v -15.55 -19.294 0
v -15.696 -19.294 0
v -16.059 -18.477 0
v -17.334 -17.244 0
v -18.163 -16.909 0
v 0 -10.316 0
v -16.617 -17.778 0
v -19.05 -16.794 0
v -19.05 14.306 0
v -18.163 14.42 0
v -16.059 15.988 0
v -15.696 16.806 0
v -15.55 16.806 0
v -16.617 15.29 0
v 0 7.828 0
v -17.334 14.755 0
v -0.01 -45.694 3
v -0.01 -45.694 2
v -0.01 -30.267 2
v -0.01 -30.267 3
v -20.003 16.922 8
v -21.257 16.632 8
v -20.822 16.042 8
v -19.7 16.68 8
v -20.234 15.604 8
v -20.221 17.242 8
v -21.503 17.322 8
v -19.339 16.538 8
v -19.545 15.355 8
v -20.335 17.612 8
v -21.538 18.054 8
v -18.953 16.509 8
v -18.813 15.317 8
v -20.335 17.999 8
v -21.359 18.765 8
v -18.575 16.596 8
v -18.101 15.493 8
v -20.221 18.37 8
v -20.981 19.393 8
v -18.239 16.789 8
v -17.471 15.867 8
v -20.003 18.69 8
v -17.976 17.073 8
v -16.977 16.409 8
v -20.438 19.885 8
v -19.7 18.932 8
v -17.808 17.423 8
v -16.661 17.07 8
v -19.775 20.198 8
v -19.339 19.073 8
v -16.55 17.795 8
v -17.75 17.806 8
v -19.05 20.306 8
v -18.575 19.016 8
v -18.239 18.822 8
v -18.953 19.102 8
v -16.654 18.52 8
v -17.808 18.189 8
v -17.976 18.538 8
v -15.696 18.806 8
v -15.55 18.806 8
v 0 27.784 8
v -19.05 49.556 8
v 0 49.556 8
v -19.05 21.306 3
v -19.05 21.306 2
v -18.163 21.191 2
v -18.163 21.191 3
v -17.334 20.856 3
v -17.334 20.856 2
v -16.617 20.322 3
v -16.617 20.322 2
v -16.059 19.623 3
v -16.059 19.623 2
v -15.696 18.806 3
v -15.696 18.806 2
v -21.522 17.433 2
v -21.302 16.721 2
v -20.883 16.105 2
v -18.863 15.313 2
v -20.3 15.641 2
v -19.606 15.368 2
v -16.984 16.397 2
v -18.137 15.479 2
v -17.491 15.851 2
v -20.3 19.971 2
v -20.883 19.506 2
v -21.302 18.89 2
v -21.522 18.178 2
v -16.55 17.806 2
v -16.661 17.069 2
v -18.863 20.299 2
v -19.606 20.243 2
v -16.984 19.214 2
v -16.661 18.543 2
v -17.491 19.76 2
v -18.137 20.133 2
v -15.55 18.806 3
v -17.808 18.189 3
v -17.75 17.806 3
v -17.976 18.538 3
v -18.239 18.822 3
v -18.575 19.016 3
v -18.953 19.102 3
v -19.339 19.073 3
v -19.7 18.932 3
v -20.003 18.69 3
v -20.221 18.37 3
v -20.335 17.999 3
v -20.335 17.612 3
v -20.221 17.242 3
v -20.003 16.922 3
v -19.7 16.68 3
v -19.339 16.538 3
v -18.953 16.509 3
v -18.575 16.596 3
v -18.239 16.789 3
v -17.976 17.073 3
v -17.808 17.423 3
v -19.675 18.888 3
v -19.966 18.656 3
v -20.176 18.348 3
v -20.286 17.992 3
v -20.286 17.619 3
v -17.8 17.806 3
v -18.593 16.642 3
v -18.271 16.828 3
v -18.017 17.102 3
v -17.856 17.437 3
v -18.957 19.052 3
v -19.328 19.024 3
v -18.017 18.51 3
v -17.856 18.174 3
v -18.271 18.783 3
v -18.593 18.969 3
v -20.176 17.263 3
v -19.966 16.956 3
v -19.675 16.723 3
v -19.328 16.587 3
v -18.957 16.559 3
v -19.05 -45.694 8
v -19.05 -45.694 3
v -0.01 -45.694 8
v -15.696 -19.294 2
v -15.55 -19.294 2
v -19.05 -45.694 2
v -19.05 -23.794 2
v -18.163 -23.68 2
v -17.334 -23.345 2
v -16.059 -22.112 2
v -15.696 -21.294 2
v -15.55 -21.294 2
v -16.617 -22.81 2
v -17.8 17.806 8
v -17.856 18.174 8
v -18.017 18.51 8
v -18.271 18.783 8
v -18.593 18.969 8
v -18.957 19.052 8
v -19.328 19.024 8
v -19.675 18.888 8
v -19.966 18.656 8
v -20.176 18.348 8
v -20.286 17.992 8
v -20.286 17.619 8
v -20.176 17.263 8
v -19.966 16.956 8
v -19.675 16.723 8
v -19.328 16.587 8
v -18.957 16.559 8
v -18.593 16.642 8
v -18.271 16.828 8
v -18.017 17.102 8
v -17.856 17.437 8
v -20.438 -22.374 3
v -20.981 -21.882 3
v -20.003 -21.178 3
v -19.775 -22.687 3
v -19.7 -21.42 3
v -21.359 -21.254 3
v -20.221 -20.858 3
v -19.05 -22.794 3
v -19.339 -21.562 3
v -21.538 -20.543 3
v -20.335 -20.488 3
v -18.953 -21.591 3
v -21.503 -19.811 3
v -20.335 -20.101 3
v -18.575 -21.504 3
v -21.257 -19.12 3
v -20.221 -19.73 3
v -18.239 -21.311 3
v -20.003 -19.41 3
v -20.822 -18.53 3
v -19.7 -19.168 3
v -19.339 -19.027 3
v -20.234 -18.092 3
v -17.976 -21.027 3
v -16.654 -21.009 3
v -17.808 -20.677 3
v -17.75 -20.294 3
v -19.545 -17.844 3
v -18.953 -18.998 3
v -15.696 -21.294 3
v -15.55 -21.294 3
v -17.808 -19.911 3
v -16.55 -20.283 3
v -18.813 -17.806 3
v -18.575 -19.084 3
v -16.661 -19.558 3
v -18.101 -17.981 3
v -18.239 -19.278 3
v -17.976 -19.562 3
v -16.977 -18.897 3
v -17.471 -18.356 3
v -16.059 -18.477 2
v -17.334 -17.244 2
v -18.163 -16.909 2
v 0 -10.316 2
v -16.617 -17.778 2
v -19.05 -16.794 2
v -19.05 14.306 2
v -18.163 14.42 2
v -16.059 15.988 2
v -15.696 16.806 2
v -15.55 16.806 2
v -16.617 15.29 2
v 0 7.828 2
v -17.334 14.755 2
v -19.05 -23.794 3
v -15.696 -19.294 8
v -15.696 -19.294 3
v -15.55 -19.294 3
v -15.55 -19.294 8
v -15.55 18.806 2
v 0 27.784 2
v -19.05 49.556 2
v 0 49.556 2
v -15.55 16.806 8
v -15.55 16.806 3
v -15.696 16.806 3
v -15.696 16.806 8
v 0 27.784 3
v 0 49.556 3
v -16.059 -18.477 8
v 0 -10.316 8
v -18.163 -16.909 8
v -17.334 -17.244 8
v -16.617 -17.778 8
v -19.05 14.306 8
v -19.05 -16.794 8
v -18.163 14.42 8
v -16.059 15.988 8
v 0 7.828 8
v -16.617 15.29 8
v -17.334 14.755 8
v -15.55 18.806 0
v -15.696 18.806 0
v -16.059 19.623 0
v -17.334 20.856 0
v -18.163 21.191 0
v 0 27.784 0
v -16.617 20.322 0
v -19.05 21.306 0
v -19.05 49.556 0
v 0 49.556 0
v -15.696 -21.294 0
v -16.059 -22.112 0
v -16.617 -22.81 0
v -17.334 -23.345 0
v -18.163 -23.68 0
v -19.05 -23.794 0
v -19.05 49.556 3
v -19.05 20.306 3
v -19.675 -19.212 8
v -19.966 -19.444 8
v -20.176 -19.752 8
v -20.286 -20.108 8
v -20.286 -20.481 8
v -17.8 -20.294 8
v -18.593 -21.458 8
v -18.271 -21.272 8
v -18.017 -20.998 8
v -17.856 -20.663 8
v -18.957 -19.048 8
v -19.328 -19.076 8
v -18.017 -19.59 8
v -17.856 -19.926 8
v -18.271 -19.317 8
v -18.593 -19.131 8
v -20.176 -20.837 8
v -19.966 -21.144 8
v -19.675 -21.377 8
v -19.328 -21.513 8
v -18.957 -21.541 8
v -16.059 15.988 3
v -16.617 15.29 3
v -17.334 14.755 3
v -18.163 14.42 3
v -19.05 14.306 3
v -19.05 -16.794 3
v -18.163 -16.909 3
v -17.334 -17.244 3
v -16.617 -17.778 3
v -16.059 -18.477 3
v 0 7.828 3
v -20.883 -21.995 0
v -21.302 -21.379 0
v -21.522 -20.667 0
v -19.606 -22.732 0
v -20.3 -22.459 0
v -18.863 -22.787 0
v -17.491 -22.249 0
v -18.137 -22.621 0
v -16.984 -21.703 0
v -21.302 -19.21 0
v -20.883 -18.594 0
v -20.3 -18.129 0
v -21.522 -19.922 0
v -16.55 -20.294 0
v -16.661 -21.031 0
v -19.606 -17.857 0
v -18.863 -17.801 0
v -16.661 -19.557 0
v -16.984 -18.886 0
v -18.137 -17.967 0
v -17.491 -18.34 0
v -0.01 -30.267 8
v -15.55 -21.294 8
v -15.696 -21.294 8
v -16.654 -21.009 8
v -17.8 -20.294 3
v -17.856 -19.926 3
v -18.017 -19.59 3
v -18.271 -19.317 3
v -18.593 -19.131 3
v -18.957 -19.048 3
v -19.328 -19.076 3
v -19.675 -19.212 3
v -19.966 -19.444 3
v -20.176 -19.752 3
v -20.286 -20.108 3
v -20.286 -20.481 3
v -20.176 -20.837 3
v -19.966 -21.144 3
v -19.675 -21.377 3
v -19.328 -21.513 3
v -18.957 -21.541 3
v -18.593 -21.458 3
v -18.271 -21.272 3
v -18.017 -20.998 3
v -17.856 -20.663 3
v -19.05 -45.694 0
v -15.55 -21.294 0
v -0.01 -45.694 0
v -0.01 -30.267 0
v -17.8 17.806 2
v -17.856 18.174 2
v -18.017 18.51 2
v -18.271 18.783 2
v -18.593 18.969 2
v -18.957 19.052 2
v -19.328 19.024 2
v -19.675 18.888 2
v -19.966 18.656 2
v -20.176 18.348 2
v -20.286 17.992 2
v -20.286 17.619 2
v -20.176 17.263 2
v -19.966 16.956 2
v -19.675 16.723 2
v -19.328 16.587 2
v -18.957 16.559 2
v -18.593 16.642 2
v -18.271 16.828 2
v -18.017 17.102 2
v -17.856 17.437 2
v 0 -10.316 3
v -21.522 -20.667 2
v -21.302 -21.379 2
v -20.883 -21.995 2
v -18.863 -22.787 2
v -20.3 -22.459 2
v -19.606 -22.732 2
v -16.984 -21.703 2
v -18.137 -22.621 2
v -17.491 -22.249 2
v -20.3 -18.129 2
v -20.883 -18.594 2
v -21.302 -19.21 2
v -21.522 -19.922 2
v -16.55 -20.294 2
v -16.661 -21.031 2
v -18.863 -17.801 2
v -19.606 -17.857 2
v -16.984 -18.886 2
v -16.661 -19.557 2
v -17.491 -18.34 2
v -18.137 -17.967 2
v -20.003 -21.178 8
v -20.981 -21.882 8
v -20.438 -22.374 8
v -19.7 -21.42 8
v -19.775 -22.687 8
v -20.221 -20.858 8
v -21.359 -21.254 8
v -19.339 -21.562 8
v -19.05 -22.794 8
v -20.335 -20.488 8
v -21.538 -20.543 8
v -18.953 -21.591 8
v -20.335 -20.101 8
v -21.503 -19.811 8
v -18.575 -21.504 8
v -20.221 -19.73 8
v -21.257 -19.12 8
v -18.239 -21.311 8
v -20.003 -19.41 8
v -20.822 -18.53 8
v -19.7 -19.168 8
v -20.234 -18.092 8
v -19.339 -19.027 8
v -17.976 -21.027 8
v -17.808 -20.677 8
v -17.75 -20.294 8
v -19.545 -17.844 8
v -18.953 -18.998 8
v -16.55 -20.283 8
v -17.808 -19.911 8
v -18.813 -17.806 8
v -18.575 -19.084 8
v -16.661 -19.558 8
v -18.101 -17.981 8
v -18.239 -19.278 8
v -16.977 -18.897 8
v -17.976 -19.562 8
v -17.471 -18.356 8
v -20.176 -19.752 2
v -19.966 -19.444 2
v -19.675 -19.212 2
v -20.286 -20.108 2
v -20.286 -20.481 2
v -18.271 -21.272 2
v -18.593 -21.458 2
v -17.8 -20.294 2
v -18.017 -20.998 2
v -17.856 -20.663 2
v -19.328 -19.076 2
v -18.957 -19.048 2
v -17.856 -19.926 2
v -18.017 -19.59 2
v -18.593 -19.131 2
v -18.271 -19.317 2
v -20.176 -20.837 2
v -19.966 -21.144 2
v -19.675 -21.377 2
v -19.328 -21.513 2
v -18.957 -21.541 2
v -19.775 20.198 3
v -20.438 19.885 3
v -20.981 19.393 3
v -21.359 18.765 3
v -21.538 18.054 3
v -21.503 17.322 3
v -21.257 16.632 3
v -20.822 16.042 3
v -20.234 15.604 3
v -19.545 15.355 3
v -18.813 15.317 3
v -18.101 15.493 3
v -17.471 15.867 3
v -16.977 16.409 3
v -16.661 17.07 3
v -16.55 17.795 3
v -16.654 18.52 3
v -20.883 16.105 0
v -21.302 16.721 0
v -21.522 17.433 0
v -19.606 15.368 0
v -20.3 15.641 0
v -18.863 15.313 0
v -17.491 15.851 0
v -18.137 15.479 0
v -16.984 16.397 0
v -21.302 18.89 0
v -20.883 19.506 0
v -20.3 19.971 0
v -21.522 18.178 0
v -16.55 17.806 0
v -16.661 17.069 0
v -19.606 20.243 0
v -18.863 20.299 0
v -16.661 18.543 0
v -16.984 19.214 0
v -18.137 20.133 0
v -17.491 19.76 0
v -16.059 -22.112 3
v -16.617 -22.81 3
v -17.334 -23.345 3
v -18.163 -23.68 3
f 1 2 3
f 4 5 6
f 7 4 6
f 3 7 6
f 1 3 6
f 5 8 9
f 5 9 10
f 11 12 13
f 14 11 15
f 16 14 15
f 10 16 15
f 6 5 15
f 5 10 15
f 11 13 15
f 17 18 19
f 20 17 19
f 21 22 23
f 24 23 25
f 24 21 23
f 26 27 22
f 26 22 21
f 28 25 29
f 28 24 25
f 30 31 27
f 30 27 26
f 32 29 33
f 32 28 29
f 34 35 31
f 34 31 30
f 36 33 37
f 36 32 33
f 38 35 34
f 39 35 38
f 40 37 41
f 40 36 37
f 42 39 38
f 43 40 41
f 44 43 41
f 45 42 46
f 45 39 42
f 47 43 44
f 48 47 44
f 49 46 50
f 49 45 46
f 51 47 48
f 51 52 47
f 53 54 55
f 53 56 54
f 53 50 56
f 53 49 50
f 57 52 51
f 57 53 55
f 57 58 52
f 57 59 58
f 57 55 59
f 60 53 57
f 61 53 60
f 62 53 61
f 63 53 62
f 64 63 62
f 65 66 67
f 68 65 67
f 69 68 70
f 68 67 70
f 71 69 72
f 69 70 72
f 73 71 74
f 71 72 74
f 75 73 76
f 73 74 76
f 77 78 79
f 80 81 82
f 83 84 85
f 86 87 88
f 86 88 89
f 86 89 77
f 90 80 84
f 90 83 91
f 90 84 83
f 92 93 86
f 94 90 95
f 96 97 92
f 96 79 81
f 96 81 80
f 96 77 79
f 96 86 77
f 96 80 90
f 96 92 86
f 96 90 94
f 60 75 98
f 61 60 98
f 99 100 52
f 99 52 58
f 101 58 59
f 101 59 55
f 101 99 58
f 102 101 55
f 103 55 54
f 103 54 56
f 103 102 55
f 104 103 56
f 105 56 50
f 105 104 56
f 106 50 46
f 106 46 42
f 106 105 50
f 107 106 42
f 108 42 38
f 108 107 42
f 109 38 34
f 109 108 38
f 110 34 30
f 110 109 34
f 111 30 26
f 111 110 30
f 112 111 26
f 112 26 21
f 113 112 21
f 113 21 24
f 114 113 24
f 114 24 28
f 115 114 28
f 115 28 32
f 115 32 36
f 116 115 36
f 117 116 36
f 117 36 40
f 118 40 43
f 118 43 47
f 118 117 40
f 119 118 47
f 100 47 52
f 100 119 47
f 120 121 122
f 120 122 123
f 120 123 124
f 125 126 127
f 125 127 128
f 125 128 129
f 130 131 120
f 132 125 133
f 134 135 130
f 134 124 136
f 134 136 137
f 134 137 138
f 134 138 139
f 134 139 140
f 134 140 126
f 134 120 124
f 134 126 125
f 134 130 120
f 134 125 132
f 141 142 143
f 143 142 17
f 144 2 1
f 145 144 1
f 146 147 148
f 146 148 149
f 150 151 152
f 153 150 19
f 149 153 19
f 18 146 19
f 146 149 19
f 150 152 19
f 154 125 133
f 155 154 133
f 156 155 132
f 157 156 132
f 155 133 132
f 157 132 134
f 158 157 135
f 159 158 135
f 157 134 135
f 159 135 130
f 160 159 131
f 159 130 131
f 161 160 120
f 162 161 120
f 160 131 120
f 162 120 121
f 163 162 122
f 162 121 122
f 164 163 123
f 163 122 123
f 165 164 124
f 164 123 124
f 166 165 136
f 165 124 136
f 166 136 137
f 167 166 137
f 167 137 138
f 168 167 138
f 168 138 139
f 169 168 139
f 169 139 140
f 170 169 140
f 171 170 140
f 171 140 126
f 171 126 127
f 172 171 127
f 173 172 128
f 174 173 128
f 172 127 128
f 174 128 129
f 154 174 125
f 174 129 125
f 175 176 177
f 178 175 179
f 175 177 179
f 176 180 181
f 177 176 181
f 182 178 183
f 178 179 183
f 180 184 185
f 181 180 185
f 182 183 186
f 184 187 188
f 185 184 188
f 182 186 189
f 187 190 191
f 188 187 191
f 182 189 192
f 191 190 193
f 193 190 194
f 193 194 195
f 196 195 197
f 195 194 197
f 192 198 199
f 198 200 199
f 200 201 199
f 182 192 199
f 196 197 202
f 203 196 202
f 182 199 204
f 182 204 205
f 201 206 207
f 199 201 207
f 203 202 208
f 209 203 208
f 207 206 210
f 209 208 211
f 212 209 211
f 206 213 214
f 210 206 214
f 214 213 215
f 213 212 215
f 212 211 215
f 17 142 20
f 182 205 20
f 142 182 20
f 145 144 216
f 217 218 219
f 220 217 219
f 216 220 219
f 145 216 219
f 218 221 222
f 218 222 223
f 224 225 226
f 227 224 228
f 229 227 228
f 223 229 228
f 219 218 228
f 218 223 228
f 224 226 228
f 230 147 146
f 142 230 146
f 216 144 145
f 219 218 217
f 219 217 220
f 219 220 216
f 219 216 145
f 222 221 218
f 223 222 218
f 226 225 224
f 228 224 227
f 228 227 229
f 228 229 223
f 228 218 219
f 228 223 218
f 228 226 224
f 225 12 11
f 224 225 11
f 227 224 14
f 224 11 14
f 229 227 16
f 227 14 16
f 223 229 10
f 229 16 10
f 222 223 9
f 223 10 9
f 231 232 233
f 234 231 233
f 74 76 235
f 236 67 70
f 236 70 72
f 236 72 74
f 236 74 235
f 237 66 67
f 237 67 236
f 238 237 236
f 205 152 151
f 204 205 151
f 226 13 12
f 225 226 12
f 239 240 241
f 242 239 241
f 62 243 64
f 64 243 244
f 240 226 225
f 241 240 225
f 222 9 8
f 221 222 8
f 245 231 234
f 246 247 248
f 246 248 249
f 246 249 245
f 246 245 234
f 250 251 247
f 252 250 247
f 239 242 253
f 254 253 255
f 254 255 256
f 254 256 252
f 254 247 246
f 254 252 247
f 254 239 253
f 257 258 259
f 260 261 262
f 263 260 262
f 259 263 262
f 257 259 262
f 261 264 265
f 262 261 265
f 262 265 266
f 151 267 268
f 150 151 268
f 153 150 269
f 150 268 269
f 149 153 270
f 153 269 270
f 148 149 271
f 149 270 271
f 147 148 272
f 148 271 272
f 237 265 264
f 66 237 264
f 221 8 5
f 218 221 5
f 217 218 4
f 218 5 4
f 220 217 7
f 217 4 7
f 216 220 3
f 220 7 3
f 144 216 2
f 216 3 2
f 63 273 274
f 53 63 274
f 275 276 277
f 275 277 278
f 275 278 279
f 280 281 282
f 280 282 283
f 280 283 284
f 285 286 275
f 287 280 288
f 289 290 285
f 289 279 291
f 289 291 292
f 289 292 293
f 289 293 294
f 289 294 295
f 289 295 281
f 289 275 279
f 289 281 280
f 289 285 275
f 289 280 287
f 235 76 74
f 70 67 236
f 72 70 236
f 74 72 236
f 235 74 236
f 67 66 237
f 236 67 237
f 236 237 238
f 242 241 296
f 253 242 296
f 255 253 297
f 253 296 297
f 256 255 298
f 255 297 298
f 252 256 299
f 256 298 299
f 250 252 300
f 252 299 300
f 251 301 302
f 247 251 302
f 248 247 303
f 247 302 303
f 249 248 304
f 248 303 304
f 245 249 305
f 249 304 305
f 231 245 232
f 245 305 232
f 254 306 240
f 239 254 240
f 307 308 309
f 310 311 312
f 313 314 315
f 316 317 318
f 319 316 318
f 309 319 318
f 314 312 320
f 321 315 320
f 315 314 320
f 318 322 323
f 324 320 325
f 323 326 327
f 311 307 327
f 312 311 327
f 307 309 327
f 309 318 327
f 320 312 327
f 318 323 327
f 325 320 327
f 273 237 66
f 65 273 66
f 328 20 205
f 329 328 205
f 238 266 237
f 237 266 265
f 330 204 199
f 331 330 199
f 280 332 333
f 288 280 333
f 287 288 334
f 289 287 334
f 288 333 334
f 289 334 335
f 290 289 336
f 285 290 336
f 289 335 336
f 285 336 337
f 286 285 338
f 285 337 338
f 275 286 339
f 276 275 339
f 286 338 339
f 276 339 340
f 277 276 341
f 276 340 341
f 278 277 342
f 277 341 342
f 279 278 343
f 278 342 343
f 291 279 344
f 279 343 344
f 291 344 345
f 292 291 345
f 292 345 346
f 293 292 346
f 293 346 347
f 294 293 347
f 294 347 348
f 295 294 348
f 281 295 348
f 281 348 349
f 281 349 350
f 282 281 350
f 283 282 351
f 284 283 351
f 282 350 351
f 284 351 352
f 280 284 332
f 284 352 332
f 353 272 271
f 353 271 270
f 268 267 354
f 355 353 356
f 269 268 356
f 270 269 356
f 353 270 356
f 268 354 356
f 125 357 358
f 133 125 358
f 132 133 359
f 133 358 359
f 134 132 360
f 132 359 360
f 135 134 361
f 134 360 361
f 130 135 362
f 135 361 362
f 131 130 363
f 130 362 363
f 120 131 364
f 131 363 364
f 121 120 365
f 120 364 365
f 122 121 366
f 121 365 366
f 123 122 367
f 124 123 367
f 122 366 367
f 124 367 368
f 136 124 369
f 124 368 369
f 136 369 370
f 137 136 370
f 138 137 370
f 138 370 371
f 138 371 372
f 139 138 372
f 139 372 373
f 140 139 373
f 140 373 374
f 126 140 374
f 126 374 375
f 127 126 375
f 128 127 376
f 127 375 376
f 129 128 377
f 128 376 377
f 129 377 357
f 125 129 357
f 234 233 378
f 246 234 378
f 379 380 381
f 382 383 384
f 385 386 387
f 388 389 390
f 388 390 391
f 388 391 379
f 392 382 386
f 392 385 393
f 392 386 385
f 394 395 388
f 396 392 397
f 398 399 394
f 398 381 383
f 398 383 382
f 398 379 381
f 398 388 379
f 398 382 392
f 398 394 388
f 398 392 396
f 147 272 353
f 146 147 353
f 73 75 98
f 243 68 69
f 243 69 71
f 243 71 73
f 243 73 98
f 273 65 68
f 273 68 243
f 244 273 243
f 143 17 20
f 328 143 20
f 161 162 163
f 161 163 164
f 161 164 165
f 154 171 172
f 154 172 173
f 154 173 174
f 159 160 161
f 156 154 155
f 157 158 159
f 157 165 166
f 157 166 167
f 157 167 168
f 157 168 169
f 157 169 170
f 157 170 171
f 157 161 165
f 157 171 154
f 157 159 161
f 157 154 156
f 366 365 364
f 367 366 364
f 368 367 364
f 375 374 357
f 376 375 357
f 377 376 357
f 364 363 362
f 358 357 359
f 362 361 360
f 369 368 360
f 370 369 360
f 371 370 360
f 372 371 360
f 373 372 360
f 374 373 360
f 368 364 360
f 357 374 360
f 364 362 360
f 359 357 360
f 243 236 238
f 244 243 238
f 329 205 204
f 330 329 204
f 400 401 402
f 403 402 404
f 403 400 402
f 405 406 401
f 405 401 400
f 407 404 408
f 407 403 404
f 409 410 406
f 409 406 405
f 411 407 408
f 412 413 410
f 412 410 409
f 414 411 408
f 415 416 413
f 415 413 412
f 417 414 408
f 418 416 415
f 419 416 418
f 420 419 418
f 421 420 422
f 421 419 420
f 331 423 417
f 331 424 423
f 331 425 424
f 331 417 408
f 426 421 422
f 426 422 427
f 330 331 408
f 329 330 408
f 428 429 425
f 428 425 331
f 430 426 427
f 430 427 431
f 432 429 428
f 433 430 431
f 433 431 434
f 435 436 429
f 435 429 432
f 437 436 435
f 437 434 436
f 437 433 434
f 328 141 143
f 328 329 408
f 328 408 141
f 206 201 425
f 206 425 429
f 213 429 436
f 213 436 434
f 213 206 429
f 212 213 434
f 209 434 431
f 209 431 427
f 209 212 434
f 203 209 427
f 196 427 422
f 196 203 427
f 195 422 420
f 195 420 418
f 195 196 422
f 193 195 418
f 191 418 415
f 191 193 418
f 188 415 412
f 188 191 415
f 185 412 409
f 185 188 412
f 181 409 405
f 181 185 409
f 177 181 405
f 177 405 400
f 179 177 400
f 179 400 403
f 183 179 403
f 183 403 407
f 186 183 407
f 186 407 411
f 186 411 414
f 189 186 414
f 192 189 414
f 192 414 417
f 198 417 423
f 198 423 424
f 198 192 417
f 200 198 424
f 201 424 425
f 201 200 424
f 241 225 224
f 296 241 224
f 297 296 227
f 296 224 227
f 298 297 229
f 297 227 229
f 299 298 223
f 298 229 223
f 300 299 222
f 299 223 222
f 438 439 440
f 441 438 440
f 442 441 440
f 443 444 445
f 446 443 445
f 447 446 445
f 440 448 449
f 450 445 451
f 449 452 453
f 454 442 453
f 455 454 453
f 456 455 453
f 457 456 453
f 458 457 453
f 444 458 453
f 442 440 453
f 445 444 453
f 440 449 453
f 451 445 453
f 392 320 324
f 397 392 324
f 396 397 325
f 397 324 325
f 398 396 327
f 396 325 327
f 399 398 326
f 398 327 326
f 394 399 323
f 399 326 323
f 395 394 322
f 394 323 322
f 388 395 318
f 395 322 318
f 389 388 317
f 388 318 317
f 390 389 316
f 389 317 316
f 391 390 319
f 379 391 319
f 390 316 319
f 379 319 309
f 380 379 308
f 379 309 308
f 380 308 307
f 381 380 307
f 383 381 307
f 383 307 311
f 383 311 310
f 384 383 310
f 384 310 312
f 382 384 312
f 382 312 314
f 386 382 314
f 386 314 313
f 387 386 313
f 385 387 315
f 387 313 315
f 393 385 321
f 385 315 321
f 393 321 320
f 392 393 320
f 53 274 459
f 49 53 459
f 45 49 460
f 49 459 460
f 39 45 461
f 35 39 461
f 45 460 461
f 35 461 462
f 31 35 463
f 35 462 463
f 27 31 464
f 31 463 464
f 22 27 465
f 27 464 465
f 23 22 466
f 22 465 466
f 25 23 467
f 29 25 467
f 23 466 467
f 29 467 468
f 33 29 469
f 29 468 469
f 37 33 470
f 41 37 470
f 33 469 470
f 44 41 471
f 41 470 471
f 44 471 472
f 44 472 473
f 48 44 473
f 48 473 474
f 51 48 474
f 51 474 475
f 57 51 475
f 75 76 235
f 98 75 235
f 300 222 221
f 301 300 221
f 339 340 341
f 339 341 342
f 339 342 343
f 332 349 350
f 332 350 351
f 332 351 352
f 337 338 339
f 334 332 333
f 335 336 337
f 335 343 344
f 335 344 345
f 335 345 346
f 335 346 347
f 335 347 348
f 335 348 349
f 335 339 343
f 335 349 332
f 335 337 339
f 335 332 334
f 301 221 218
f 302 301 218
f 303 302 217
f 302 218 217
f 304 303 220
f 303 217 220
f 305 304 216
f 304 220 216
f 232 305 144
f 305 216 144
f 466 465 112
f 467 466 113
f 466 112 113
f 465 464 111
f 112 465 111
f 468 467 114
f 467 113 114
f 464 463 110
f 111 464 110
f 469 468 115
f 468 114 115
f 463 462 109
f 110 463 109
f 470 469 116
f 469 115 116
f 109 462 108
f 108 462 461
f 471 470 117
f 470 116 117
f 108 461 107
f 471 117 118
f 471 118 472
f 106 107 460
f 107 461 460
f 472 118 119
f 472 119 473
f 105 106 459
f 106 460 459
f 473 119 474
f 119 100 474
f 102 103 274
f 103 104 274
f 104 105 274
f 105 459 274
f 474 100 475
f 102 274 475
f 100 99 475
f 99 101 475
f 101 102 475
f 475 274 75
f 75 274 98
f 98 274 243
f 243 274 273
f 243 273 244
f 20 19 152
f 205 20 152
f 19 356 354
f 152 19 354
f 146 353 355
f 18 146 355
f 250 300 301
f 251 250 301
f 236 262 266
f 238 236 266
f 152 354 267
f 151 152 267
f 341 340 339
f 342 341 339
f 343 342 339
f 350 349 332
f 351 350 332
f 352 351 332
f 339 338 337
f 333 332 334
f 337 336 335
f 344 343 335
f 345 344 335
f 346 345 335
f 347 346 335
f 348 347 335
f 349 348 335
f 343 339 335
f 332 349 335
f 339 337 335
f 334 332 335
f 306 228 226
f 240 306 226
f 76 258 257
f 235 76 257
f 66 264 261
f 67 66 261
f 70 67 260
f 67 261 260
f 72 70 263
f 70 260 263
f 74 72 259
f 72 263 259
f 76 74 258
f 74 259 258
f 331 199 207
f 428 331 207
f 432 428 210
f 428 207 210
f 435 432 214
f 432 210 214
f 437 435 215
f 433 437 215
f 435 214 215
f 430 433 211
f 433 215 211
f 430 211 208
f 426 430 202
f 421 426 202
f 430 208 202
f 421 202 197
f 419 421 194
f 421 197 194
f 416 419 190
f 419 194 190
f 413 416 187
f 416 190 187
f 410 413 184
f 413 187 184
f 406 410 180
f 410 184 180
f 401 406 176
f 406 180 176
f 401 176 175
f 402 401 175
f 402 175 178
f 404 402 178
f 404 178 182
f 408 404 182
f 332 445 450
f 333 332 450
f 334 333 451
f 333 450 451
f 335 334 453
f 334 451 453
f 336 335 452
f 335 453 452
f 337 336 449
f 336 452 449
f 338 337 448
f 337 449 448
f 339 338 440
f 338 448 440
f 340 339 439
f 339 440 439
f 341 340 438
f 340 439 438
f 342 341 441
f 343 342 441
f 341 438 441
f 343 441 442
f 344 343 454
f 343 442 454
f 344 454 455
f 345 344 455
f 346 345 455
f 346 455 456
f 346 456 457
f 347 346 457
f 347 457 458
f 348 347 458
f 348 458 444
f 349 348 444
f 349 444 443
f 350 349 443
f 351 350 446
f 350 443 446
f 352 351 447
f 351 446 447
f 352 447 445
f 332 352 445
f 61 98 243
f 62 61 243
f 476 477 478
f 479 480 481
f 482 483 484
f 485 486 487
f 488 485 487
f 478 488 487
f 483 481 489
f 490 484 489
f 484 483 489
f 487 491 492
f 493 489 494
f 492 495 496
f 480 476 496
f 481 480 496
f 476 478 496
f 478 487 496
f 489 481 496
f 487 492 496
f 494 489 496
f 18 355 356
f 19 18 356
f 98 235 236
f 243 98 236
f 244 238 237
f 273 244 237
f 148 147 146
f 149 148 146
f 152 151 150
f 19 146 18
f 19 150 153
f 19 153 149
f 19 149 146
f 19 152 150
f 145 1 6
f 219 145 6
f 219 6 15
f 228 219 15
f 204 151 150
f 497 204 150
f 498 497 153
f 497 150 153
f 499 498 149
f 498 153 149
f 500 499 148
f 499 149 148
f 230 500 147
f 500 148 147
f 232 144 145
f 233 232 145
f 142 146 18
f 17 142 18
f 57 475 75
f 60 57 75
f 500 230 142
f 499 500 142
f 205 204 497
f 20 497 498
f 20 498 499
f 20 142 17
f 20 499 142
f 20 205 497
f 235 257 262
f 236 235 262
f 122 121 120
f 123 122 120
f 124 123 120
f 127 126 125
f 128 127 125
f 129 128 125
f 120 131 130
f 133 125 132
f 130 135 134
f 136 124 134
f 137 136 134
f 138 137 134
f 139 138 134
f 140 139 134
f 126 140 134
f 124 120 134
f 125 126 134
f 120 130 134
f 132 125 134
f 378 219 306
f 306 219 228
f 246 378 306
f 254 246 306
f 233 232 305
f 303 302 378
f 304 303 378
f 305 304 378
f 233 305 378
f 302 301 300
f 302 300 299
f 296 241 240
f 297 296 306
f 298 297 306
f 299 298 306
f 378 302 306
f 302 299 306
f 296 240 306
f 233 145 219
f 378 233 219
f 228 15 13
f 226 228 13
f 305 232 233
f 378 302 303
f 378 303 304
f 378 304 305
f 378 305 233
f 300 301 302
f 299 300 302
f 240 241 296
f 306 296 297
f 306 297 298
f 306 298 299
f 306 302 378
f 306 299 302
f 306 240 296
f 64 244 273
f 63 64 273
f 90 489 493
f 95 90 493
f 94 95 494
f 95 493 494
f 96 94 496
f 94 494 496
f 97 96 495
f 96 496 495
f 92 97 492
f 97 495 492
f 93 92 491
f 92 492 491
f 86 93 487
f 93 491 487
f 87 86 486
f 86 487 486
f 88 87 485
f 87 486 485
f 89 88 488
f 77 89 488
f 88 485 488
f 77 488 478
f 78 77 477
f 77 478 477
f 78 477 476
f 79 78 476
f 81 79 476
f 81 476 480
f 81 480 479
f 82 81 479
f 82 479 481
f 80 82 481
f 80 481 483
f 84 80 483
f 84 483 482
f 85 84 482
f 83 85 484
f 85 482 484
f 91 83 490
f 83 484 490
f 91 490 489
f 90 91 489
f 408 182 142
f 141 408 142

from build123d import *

# Parameters (mm, degrees)
F1_DEPTH = 2
F0_R     = 2.5
F3_DEPTH = 1
F2_R     = 1.25
F4_R     = 1.3
F5_DEPTH = 5
F4_R_2   = 1.25


# Not quite as in the source:
# - a feature of the source that left no trace in its solid (it failed there, or was rolled back) is left out


with BuildPart() as f1:
    # F0 (on Top) → F1 (new body)
    with BuildSketch(Plane.XY):
        with BuildLine():
            Line((0, 49.5557405042), (-19.05, 49.5557405042))
            Line((-19.05, 49.5557405042), (-19.05, 21.3057405042))
            ThreePointArc((-19.05, 21.3057405042), (-16.9583499337, 20.6119835443), (-15.6958980338, 18.8057405042))
            Line((-15.6958980338, 18.8057405042), (-15.55, 18.8057405042))
            Line((-15.55, 18.8057405042), (0, 27.7835371901))
            Line((0, 27.7835371901), (0, 49.5557405042))
        make_face()
    extrude(amount=F1_DEPTH)


with BuildPart() as f1b:
    # F0 (on Top) → F1, piece 2 (new body)
    with BuildSketch(Plane.XY):
        with BuildLine():
            Line((0, -10.3164628099), (0, 7.8279438183))
            Line((0, 7.8279438183), (-15.55, 16.8057405042))
            Line((-15.55, 16.8057405042), (-15.6958980338, 16.8057405042))
            ThreePointArc((-15.6958980338, 16.8057405042), (-16.9583499337, 14.9994974641), (-19.05, 14.3057405042))
            Line((-19.05, 14.3057405042), (-19.05, -16.7942594958))
            ThreePointArc((-19.05, -16.7942594958), (-16.9583499337, -17.4880164557), (-15.6958980338, -19.2942594958))
            Line((-15.6958980338, -19.2942594958), (-15.55, -19.2942594958))
            Line((-15.55, -19.2942594958), (0, -10.3164628099))
        make_face()
    extrude(amount=F1_DEPTH)


with BuildPart() as f1c:
    # F0 (on Top) → F1, piece 3 (new body)
    with BuildSketch(Plane.XY):
        with BuildLine():
            Line((-19.05, -23.7942594958), (-19.05, -45.6942594958))
            Line((-19.05, -45.6942594958), (-0.0095496495, -45.6942594958))
            Line((-0.0095496495, -45.6942594958), (-0.0095496495, -30.266542689))
            Line((-0.0095496495, -30.266542689), (-15.55, -21.2942594958))
            Line((-15.55, -21.2942594958), (-15.6958980338, -21.2942594958))
            ThreePointArc((-15.6958980338, -21.2942594958), (-16.9583499337, -23.1005025359), (-19.05, -23.7942594958))
        make_face()
    extrude(amount=F1_DEPTH)


with BuildPart() as f1d:
    # F0 (on Top) → F1, piece 4 (new body)
    with BuildSketch(Plane.XY):
        with Locations((-19.05, 17.8057405042)):
            Circle(F0_R)
    extrude(amount=F1_DEPTH)


with BuildPart() as f1e:
    # F0 (on Top) → F1, piece 5 (new body)
    with BuildSketch(Plane.XY):
        with Locations((-19.05, -20.2942594958)):
            Circle(F0_R)
    extrude(amount=F1_DEPTH)


with BuildPart() as f3:
    # F2 (on face) → F3 (new body)
    with BuildSketch(Plane.XY.offset(2)):
        with BuildLine():
            ThreePointArc((-19.05, 21.3057405042), (-16.9583499337, 20.6119835443), (-15.6958980338, 18.8057405042))
            Line((-15.6958980338, 18.8057405042), (-15.55, 18.8057405042))
            Line((-15.55, 18.8057405042), (0, 27.7835371901))
            Line((0, 27.7835371901), (0, 49.5557405042))
            Line((0, 49.5557405042), (-19.05, 49.5557405042))
            Line((-19.05, 49.5557405042), (-19.05, 21.3057405042))
        make_face()
    extrude(amount=F3_DEPTH)


with BuildPart() as f3b:
    # F2 (on face) → F3, piece 2 (new body)
    with BuildSketch(Plane.XY.offset(2)):
        with BuildLine():
            Line((-15.55, 16.8057405042), (-15.6958980338, 16.8057405042))
            ThreePointArc((-15.6958980338, 16.8057405042), (-16.9583499337, 14.9994974641), (-19.05, 14.3057405042))
            Line((-19.05, 14.3057405042), (-19.05, -16.7942594958))
            ThreePointArc((-19.05, -16.7942594958), (-16.9583499337, -17.4880164557), (-15.6958980338, -19.2942594958))
            Line((-15.6958980338, -19.2942594958), (-15.55, -19.2942594958))
            Line((-15.55, -19.2942594958), (0, -10.3164628099))
            Line((0, -10.3164628099), (0, 7.8279438183))
            Line((0, 7.8279438183), (-15.55, 16.8057405042))
        make_face()
    extrude(amount=F3_DEPTH)


with BuildPart() as f3c:
    # F2 (on face) → F3, piece 3 (new body)
    with BuildSketch(Plane.XY.offset(2)):
        with BuildLine():
            Line((-0.0095496495, -45.6942594958), (-0.0095496495, -30.266542689))
            Line((-0.0095496495, -30.266542689), (-15.55, -21.2942594958))
            Line((-15.55, -21.2942594958), (-15.6958980338, -21.2942594958))
            ThreePointArc((-15.6958980338, -21.2942594958), (-16.9583499337, -23.1005025359), (-19.05, -23.7942594958))
            Line((-19.05, -23.7942594958), (-19.05, -45.6942594958))
            Line((-19.05, -45.6942594958), (-0.0095496495, -45.6942594958))
        make_face()
    extrude(amount=F3_DEPTH)


with BuildPart() as f3d:
    # F2 (on face) → F3, piece 4 (new body)
    with BuildSketch(Plane.XY.offset(2)):
        with Locations((-19.05, 17.8057405042)):
            Circle(F2_R)
    extrude(amount=F3_DEPTH)


with BuildPart() as f3e:
    # F2 (on face) → F3, piece 5 (new body)
    with BuildSketch(Plane.XY.offset(2)):
        with Locations((-19.05, -20.2942594958)):
            Circle(F2_R)
    extrude(amount=F3_DEPTH)


with BuildPart() as f5:
    # F4 (on face) → F5 (new body)
    with BuildSketch(Plane.XY.offset(3)):
        with BuildLine():
            Line((-16.6542128813, 18.5200262185), (-15.6958980338, 18.8057405042))
            Line((-15.6958980338, 18.8057405042), (-15.55, 18.8057405042))
            Line((-15.55, 18.8057405042), (0, 27.7835371901))
            Line((0, 27.7835371901), (0, 49.5557405042))
            Line((0, 49.5557405042), (-19.05, 49.5557405042))
            Line((-19.05, 49.5557405042), (-19.05, 21.3057405042))
            Line((-19.05, 21.3057405042), (-19.05, 20.3057405042))
            ThreePointArc((-19.05, 20.3057405042), (-20.5440357617, 15.8012811898), (-16.6542128813, 18.5200262185))
        make_face()
        with Locations((-19.05, 17.8057405042)):
            Circle(F4_R, mode=Mode.SUBTRACT)
    extrude(amount=F5_DEPTH)


with BuildPart() as f5b:
    # F4 (on face) → F5, piece 2 (new body)
    with BuildSketch(Plane.XY.offset(3)):
        with BuildLine():
            Line((0, -10.3164628099), (0, 7.8279438183))
            Line((0, 7.8279438183), (-15.55, 16.8057405042))
            Line((-15.55, 16.8057405042), (-15.6958980338, 16.8057405042))
            ThreePointArc((-15.6958980338, 16.8057405042), (-16.9583499337, 14.9994974641), (-19.05, 14.3057405042))
            Line((-19.05, 14.3057405042), (-19.05, -16.7942594958))
            ThreePointArc((-19.05, -16.7942594958), (-16.9583499337, -17.4880164557), (-15.6958980338, -19.2942594958))
            Line((-15.6958980338, -19.2942594958), (-15.55, -19.2942594958))
            Line((-15.55, -19.2942594958), (0, -10.3164628099))
        make_face()
    extrude(amount=F5_DEPTH)


with BuildPart() as f5c:
    # F4 (on face) → F5, piece 3 (new body)
    with BuildSketch(Plane.XY.offset(3)):
        with BuildLine():
            Line((-19.05, -23.7942594958), (-19.05, -45.6942594958))
            Line((-19.05, -45.6942594958), (-0.0095496495, -45.6942594958))
            Line((-0.0095496495, -45.6942594958), (-0.0095496495, -30.266542689))
            Line((-0.0095496495, -30.266542689), (-15.55, -21.2942594958))
            Line((-15.55, -21.2942594958), (-15.6958980338, -21.2942594958))
            Line((-15.6958980338, -21.2942594958), (-16.6542128813, -21.0085452101))
            ThreePointArc((-16.6542128813, -21.0085452101), (-20.5440357617, -18.2898001815), (-19.05, -22.7942594958))
            Line((-19.05, -22.7942594958), (-19.05, -23.7942594958))
        make_face()
        with Locations((-19.05, -20.2942594958)):
            Circle(F4_R, mode=Mode.SUBTRACT)
    extrude(amount=F5_DEPTH)


with BuildPart() as f5d:
    # F4 (on face) → F5, piece 4 (new body)
    with BuildSketch(Plane.XY.offset(3)):
        with Locations((-19.05, 17.8057405042)):
            Circle(F4_R_2)
    extrude(amount=F5_DEPTH)


with BuildPart() as f5e:
    # F4 (on face) → F5, piece 5 (new body)
    with BuildSketch(Plane.XY.offset(3)):
        with Locations((-19.05, -20.2942594958)):
            Circle(F4_R_2)
    extrude(amount=F5_DEPTH)


solid = Compound([f1.part, f1b.part, f1c.part, f1d.part, f1e.part, f3.part, f3b.part, f3c.part, f3d.part, f3e.part, f5.part, f5b.part, f5c.part, f5d.part, f5e.part])
